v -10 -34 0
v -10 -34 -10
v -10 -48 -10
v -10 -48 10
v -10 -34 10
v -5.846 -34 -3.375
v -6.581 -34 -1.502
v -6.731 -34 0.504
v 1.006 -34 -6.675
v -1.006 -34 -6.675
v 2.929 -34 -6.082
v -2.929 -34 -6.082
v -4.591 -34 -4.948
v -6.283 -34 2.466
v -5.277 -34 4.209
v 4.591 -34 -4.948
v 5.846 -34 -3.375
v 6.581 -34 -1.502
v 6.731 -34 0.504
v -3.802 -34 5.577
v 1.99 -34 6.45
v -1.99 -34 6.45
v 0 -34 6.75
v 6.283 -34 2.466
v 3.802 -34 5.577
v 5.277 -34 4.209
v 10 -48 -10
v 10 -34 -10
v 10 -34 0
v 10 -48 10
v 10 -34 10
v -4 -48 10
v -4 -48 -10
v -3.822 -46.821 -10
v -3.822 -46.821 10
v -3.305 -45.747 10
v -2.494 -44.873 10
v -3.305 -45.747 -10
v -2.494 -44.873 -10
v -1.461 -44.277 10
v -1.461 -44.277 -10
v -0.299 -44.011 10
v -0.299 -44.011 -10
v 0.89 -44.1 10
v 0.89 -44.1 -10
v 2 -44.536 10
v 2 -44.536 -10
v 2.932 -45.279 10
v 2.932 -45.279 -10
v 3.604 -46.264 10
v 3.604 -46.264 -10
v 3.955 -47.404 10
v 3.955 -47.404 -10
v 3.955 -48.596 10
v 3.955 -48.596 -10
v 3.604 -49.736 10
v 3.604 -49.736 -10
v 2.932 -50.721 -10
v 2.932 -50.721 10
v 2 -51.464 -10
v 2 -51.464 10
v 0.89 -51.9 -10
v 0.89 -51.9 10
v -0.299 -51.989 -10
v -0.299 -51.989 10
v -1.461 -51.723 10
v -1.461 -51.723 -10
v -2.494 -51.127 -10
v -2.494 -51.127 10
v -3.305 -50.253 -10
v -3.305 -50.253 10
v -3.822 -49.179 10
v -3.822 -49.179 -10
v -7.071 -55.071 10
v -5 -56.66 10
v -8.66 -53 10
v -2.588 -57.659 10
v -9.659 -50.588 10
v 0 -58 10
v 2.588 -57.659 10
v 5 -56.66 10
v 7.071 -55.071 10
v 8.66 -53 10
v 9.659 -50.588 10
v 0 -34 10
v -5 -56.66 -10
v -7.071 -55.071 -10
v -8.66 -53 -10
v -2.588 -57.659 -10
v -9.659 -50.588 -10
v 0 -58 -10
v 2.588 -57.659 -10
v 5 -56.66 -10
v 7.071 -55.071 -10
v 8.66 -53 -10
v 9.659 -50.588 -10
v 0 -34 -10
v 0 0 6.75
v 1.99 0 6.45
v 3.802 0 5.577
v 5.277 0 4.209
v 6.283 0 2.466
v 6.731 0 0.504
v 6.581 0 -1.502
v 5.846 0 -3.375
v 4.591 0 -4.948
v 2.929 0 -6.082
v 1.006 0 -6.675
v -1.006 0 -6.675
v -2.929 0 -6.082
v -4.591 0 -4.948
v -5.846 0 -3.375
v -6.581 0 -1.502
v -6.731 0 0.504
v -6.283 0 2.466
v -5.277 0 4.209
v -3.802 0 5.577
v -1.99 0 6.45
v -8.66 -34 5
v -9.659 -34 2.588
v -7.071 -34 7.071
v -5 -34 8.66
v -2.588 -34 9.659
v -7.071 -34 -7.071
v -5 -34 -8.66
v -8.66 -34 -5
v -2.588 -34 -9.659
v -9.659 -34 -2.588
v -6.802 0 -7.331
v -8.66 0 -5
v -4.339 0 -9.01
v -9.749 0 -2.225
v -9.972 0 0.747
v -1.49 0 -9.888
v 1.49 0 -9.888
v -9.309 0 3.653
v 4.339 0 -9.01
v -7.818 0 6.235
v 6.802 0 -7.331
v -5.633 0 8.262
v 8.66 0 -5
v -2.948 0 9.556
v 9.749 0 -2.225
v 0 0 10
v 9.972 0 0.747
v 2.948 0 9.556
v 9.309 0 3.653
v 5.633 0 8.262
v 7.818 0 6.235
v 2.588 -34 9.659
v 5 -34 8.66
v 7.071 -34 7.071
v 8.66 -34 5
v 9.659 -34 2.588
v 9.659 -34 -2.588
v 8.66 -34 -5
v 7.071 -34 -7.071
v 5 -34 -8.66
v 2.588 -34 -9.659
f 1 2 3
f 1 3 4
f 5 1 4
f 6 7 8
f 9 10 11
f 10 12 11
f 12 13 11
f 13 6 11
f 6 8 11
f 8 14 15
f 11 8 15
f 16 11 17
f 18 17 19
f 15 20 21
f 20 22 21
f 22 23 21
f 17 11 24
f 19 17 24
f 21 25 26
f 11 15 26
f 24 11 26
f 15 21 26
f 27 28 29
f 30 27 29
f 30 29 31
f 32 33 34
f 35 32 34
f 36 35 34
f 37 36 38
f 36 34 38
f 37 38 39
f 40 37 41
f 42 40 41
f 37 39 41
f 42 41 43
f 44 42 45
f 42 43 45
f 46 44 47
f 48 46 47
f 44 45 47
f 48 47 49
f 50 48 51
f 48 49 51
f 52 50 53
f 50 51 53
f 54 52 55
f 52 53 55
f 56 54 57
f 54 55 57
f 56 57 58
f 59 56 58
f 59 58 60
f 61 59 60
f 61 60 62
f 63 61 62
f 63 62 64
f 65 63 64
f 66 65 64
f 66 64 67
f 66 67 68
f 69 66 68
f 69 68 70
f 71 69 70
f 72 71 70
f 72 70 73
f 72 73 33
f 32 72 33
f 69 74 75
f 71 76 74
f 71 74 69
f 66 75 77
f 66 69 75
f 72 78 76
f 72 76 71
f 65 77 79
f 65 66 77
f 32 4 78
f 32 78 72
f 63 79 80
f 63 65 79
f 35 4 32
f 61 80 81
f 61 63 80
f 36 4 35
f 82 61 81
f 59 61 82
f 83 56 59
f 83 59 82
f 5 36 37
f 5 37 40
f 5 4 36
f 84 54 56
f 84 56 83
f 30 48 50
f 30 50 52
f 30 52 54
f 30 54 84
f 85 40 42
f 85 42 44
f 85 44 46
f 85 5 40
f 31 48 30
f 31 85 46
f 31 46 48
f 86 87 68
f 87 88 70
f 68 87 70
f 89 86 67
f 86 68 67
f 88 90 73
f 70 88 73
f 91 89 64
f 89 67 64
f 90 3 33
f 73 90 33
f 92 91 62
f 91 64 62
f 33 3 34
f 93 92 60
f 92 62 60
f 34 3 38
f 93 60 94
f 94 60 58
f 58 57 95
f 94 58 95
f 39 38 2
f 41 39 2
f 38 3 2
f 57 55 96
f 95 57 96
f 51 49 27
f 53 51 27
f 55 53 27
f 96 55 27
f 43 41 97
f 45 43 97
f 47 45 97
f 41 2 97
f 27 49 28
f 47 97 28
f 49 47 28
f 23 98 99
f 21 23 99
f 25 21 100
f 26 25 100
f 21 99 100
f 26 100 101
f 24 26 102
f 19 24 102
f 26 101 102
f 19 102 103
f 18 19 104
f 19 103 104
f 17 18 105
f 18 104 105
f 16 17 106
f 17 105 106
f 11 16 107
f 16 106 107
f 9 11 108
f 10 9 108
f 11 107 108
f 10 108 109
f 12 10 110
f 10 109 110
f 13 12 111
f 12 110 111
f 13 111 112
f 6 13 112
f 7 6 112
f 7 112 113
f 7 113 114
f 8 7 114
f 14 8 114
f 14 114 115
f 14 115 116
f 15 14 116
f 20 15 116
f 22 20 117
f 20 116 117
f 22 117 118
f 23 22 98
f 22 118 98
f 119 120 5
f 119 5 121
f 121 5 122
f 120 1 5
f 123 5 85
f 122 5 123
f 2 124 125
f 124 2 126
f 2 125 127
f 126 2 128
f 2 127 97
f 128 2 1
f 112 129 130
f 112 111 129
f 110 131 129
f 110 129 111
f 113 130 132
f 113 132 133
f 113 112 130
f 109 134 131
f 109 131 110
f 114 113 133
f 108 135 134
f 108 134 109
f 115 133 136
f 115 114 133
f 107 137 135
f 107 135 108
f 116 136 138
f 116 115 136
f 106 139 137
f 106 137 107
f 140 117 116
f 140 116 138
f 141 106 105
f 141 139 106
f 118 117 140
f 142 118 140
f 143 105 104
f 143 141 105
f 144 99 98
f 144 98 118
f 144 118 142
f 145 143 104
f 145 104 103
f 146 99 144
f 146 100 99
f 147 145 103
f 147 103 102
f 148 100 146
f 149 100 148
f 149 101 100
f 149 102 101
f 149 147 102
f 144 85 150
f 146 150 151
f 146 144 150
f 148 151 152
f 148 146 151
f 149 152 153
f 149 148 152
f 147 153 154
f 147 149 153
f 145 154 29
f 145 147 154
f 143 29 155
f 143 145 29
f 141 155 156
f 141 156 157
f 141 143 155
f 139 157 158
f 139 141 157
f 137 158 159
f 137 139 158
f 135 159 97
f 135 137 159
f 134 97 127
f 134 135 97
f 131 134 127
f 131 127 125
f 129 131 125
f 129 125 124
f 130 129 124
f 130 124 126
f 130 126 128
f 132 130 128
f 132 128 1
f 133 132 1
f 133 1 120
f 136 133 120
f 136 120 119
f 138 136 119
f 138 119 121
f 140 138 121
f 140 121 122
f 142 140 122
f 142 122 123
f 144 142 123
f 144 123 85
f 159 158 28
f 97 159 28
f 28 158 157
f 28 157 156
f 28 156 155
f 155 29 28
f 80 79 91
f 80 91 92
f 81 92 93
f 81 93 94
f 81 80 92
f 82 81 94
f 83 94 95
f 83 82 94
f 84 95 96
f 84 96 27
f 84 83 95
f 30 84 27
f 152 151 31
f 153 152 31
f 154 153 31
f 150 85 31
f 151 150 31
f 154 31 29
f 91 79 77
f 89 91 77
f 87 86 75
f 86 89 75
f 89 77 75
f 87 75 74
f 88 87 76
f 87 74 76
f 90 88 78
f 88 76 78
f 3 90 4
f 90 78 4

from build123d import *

# Parameters (mm, degrees)
SKETCH2_R           = 10
SKETCH2_R_2         = 6.75
BOSS_EXTRUDE1_DEPTH = 34
SKETCH3_W           = 20
SKETCH3_H           = 20
BOSS_EXTRUDE2_DEPTH = 24
CUT_EXTRUDE1_DEPTH  = 24
SKETCH5_R           = 4
CUT_EXTRUDE2_DEPTH  = 63.161081072


with BuildPart() as part:
    # Sketch2 → Boss-Extrude1 (new body)
    with BuildSketch(Plane(origin=(0, 0, 0), x_dir=(1, 0, 0), z_dir=(0, 1, 0))):
        with Locations(Location((0, 0, 0), (0, 0, 270))):
            Circle(SKETCH2_R)
        with Locations(Location((0, 0, 0), (0, 0, 270))):
            Circle(SKETCH2_R_2, mode=Mode.SUBTRACT)
    extrude(amount=-BOSS_EXTRUDE1_DEPTH)

    # Sketch3 → Boss-Extrude2 (add)
    with BuildSketch(Plane.XZ.offset(34)):
        Rectangle(SKETCH3_W, SKETCH3_H)
    extrude(amount=BOSS_EXTRUDE2_DEPTH)

    # Sketch4 → Cut-Extrude1 (cut, symmetric)
    with BuildSketch(Plane.XY):
        with BuildLine():
            Line((-10, -58), (0, -58))
            ThreePointArc((0, -58), (-7.071067812, -55.071067812), (-10, -48))
            Line((-10, -48), (-10, -58))
        make_face()
    cut_extrude1 = extrude(amount=CUT_EXTRUDE1_DEPTH, both=True, mode=Mode.SUBTRACT)

    # Mirror1: Cut-Extrude1 across plane
    add(cut_extrude1.mirror(Plane(origin=(0, 0, 0), x_dir=(0, 0, 1), z_dir=(1, 0, 0))), mode=Mode.SUBTRACT)

    # Sketch5 → Cut-Extrude2 (cut, through all)
    with BuildSketch(Plane(origin=(0, 0, -10), x_dir=(-1, 0, 0), z_dir=(0, 0, -1))):
        with Locations((0, -48)):
            Circle(SKETCH5_R)
    extrude(amount=-CUT_EXTRUDE2_DEPTH, mode=Mode.SUBTRACT)


solid = part.part
